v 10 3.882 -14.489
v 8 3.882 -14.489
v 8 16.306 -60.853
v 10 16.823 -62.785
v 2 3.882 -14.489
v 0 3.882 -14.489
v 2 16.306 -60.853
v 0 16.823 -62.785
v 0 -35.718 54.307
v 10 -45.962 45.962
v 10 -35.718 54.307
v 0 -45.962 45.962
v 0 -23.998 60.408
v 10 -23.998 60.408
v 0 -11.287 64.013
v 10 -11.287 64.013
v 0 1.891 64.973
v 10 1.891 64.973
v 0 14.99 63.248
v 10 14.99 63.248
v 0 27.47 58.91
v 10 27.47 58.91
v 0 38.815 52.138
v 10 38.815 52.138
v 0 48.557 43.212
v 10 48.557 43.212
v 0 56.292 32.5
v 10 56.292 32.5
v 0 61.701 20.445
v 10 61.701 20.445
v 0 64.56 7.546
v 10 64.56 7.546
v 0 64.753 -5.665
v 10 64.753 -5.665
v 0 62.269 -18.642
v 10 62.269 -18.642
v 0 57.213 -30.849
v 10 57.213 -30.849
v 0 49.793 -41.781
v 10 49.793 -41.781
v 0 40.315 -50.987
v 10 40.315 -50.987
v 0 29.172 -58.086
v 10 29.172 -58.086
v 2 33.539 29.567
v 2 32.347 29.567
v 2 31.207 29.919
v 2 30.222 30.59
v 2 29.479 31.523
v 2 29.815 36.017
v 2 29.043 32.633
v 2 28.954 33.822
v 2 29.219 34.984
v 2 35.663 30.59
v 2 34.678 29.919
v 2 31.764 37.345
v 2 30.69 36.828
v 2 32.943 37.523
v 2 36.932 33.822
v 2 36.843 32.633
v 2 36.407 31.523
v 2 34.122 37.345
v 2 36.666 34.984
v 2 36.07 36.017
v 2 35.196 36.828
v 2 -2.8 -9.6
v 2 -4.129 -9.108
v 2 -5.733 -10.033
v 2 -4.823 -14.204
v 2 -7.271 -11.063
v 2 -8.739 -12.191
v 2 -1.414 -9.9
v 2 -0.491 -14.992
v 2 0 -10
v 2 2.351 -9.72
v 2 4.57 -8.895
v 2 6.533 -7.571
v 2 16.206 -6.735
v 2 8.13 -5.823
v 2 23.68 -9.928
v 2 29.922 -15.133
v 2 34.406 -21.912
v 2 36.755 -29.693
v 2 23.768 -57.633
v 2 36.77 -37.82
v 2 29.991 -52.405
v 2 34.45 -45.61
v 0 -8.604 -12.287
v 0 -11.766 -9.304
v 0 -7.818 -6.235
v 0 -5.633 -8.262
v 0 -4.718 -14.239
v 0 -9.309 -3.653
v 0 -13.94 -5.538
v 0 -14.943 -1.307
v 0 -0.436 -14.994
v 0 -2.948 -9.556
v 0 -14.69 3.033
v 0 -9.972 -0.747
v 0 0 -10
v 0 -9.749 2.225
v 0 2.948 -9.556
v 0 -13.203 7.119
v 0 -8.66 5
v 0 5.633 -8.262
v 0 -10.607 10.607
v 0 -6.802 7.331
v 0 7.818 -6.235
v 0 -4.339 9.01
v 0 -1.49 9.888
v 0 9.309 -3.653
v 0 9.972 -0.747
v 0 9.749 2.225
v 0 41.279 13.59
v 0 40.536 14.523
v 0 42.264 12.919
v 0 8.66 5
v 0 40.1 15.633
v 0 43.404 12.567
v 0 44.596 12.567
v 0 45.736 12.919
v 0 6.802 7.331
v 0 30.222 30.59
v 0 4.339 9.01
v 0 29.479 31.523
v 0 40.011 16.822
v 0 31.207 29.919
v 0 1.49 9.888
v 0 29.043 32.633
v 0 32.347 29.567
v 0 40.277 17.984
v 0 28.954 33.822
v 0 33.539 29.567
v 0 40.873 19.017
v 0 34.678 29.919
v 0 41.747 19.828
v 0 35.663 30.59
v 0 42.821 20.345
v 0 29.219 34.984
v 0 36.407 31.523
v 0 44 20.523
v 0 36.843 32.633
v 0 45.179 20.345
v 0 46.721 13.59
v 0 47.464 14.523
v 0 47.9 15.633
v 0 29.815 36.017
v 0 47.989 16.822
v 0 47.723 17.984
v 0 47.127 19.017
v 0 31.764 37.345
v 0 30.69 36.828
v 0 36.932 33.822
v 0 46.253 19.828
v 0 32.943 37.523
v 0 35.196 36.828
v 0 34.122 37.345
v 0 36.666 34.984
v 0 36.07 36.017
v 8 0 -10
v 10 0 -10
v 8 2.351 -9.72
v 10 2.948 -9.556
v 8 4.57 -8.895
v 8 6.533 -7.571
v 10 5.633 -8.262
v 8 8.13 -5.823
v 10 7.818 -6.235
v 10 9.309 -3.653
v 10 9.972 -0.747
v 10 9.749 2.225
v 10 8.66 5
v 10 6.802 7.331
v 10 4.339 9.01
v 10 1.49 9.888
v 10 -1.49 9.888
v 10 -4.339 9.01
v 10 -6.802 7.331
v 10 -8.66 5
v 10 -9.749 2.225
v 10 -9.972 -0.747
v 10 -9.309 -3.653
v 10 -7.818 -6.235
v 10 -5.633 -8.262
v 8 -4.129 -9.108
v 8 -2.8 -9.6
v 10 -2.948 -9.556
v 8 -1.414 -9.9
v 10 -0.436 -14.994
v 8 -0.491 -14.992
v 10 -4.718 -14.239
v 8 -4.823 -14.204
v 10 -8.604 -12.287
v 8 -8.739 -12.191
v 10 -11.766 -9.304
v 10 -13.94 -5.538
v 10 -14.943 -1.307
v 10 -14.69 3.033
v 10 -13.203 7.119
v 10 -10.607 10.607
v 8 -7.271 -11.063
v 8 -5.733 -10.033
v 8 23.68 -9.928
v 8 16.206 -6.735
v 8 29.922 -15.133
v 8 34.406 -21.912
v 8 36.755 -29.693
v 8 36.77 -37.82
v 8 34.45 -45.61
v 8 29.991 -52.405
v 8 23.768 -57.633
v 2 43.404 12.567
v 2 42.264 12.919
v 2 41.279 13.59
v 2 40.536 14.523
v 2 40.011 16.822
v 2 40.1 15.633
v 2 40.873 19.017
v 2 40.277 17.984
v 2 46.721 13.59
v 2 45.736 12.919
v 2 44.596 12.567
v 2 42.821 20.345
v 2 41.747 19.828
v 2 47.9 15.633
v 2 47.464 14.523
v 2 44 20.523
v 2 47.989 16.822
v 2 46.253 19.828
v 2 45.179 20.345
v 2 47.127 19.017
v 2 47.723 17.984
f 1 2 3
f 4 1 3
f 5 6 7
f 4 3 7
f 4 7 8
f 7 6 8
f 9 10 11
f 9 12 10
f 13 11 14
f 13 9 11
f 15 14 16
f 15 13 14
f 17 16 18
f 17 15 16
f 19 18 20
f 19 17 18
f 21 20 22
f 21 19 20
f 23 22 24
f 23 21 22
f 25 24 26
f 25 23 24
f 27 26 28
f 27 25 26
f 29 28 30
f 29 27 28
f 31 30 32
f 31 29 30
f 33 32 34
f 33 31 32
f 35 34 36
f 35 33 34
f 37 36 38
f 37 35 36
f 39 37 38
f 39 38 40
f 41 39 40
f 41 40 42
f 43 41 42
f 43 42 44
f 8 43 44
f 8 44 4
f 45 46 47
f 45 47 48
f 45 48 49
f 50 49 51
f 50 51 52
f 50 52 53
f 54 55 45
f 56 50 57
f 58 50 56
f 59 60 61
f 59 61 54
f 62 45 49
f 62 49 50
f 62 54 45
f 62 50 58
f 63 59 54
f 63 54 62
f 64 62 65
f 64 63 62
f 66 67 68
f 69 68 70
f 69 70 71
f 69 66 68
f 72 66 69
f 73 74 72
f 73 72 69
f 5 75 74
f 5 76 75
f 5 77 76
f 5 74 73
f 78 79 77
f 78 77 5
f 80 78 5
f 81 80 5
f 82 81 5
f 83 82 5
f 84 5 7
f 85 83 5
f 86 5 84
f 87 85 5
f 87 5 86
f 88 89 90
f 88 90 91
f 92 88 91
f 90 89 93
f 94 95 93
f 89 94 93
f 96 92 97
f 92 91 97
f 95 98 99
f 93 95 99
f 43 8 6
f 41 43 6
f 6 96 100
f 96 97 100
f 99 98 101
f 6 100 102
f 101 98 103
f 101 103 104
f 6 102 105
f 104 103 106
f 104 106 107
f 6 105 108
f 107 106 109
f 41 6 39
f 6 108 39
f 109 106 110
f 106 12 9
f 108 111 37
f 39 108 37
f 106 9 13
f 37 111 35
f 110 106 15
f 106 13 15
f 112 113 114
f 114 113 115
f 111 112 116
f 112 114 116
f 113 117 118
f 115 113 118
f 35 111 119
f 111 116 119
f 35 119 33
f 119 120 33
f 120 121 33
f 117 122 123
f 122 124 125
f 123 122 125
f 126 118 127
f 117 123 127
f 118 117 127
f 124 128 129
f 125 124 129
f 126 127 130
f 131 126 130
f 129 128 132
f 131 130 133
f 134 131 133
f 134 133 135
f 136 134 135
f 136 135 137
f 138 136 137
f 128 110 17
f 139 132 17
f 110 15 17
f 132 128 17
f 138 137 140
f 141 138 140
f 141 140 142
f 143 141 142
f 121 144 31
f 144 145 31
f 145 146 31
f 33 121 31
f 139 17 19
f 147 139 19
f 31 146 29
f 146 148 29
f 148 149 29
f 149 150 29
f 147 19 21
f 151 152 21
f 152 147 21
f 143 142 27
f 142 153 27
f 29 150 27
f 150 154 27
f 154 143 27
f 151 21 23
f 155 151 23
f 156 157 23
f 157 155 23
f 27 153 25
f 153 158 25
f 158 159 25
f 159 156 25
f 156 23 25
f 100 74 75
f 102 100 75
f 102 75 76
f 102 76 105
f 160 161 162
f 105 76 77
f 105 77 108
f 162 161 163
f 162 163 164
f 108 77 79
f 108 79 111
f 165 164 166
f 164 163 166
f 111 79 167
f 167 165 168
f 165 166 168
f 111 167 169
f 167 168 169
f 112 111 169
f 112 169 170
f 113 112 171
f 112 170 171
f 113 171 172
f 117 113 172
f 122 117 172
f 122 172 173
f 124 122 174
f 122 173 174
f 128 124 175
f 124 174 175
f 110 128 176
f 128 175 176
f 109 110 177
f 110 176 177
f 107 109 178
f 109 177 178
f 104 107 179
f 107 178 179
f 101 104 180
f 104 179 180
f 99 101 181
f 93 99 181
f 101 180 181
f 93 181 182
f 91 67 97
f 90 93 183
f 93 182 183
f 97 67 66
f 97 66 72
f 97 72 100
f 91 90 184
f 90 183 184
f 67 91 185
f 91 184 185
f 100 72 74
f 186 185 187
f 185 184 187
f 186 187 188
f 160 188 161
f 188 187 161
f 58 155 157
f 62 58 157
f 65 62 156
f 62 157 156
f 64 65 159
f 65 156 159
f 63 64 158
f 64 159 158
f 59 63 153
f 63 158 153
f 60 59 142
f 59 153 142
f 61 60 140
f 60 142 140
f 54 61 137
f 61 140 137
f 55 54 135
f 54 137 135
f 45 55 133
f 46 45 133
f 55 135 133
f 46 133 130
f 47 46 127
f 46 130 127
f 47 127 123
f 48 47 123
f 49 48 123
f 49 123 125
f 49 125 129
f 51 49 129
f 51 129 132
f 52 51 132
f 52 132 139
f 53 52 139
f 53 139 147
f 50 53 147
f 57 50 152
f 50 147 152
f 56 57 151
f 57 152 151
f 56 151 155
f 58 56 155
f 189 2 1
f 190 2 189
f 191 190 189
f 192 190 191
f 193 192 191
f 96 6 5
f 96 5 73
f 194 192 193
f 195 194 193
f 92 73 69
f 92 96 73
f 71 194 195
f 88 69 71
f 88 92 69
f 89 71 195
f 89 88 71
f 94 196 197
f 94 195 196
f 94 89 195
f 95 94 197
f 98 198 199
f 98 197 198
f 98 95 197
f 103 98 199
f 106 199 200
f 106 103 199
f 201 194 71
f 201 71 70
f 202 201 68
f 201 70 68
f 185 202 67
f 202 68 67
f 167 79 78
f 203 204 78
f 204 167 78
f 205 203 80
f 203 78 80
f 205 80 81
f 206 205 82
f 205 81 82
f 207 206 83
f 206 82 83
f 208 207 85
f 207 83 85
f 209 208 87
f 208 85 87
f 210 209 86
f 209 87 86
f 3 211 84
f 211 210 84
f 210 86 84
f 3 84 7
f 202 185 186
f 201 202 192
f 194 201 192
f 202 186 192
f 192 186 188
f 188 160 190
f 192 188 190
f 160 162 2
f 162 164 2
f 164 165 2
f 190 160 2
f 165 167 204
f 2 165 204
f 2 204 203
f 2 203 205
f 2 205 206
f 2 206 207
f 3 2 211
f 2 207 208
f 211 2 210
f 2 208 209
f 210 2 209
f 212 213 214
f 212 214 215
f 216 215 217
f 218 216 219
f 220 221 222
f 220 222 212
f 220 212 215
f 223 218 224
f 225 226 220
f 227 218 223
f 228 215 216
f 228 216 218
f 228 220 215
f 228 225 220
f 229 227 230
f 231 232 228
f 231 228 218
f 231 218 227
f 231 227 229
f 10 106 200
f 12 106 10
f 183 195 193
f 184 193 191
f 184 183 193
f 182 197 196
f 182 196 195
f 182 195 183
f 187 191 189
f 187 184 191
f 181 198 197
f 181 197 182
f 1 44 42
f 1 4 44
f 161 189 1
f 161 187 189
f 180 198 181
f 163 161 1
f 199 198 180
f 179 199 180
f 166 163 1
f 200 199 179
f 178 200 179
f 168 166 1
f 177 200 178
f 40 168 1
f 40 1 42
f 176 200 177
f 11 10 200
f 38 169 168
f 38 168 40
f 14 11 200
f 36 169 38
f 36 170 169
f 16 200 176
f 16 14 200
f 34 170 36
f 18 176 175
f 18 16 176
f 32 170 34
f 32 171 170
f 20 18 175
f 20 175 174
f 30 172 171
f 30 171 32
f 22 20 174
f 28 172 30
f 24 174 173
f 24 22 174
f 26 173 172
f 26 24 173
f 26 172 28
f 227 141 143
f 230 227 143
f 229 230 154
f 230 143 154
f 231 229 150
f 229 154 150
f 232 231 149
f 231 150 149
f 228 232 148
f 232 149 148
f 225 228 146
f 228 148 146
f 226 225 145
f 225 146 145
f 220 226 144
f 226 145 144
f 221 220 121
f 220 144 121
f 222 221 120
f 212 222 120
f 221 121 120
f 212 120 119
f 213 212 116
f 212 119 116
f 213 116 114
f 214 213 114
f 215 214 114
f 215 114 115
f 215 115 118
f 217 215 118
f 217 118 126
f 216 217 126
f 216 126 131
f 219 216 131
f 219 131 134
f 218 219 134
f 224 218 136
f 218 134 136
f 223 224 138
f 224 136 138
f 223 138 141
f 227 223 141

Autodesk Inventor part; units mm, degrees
ref_plane "YZ Plane" through (0, 0, 0) normal (1, 0, 0) x (0, 1, 0)
ref_plane "XZ Plane" through (0, 0, 0) normal (0, 1, 0) x (-1, 0, 0)
ref_plane "XY Plane" through (0, 0, 0) normal (0, 0, 1) x (1, 0, 0)
sketch "Boceto1" plane through (0, 0, 0) normal (1, 0, 0) x (0, 1, 0)
  circle A0 centre (0, 0) radius 65
  line L0 (0, 0) -> (-45.9619, 45.9619)
  line L1 (0, 0) -> (65, 0) construction
  line L2 (0, 0) -> (16.8232, -62.7852)
  line L3 (0, 0) -> (65, 0) construction
  circle A1 centre (0, 0) radius 15
  dimension "d5" = 130
  dimension "d6" = 135
  dimension "d7" = 75
  dimension "d8" = 30
extrude "Extrusión1" add sketch "Boceto1" along normal blind 10 contours A0 L2 A1 L0 | A1 L2 L0 | L0 L2 A1 picked at (40.3579, 26.2595)
sketch "Boceto2" plane through (0, 3.8823, -14.4889) normal (0, -0.9659258, -0.258819) x (1, 0, 0)
  line L0 (2, -20) -> (8, -20)
  line L1 (8, -20) -> (8, -48)
  line L2 (8, -48) -> (2, -48)
  line L3 (2, -48) -> (2, -20)
  line L4 (10, 0) -> (10, 27.9904) projected
  line L5 (0, -50) -> (10, -50) projected
  point P0 (0, 15)
  dimension "d11" = 6
  dimension "d12" = 28
  dimension "d18" = 2
revolve "Revolución1" cut sketch "Boceto2" angle 360 about axis through (2, 9.0587, -33.8074) along (1, 0, 0)
sketch "Boceto3" plane through (10, 0, 0) normal (1, 0, 0) x (0, 0, -1)
  circle A0 centre (0, 0) radius 10
  arc A1 (-10.6066, -10.6066) -> (14.4889, 3.8823) centre (0, 0) ccw projected
  dimension "d20" = 20
extrude "Extrusión2" cut sketch "Boceto3" against normal blind 10
sketch "Boceto4" plane through (0, 0, 0) normal (-1, 0, 0) x (0, 0, 1)
  point P0 (0, 0)
sketch "Boceto5" plane through (0, 0, 0) normal (-1, 0, 0) x (0, 0, 1)
  arc A0 (46.9928, -0.8201) -> (0, 47) centre (0, 0) ccw
  circle A1 centre (16.5227, 44) radius 4
  circle A2 centre (33.5227, 32.9428) radius 4
  dimension "d23" = 47
  dimension "d24" = 8
  dimension "d25" = 8
  dimension "d28" = 17
  dimension "d29" = 44
extrude "Extrusión3" cut sketch "Boceto5" against normal blind 2
properties part number "protector"
